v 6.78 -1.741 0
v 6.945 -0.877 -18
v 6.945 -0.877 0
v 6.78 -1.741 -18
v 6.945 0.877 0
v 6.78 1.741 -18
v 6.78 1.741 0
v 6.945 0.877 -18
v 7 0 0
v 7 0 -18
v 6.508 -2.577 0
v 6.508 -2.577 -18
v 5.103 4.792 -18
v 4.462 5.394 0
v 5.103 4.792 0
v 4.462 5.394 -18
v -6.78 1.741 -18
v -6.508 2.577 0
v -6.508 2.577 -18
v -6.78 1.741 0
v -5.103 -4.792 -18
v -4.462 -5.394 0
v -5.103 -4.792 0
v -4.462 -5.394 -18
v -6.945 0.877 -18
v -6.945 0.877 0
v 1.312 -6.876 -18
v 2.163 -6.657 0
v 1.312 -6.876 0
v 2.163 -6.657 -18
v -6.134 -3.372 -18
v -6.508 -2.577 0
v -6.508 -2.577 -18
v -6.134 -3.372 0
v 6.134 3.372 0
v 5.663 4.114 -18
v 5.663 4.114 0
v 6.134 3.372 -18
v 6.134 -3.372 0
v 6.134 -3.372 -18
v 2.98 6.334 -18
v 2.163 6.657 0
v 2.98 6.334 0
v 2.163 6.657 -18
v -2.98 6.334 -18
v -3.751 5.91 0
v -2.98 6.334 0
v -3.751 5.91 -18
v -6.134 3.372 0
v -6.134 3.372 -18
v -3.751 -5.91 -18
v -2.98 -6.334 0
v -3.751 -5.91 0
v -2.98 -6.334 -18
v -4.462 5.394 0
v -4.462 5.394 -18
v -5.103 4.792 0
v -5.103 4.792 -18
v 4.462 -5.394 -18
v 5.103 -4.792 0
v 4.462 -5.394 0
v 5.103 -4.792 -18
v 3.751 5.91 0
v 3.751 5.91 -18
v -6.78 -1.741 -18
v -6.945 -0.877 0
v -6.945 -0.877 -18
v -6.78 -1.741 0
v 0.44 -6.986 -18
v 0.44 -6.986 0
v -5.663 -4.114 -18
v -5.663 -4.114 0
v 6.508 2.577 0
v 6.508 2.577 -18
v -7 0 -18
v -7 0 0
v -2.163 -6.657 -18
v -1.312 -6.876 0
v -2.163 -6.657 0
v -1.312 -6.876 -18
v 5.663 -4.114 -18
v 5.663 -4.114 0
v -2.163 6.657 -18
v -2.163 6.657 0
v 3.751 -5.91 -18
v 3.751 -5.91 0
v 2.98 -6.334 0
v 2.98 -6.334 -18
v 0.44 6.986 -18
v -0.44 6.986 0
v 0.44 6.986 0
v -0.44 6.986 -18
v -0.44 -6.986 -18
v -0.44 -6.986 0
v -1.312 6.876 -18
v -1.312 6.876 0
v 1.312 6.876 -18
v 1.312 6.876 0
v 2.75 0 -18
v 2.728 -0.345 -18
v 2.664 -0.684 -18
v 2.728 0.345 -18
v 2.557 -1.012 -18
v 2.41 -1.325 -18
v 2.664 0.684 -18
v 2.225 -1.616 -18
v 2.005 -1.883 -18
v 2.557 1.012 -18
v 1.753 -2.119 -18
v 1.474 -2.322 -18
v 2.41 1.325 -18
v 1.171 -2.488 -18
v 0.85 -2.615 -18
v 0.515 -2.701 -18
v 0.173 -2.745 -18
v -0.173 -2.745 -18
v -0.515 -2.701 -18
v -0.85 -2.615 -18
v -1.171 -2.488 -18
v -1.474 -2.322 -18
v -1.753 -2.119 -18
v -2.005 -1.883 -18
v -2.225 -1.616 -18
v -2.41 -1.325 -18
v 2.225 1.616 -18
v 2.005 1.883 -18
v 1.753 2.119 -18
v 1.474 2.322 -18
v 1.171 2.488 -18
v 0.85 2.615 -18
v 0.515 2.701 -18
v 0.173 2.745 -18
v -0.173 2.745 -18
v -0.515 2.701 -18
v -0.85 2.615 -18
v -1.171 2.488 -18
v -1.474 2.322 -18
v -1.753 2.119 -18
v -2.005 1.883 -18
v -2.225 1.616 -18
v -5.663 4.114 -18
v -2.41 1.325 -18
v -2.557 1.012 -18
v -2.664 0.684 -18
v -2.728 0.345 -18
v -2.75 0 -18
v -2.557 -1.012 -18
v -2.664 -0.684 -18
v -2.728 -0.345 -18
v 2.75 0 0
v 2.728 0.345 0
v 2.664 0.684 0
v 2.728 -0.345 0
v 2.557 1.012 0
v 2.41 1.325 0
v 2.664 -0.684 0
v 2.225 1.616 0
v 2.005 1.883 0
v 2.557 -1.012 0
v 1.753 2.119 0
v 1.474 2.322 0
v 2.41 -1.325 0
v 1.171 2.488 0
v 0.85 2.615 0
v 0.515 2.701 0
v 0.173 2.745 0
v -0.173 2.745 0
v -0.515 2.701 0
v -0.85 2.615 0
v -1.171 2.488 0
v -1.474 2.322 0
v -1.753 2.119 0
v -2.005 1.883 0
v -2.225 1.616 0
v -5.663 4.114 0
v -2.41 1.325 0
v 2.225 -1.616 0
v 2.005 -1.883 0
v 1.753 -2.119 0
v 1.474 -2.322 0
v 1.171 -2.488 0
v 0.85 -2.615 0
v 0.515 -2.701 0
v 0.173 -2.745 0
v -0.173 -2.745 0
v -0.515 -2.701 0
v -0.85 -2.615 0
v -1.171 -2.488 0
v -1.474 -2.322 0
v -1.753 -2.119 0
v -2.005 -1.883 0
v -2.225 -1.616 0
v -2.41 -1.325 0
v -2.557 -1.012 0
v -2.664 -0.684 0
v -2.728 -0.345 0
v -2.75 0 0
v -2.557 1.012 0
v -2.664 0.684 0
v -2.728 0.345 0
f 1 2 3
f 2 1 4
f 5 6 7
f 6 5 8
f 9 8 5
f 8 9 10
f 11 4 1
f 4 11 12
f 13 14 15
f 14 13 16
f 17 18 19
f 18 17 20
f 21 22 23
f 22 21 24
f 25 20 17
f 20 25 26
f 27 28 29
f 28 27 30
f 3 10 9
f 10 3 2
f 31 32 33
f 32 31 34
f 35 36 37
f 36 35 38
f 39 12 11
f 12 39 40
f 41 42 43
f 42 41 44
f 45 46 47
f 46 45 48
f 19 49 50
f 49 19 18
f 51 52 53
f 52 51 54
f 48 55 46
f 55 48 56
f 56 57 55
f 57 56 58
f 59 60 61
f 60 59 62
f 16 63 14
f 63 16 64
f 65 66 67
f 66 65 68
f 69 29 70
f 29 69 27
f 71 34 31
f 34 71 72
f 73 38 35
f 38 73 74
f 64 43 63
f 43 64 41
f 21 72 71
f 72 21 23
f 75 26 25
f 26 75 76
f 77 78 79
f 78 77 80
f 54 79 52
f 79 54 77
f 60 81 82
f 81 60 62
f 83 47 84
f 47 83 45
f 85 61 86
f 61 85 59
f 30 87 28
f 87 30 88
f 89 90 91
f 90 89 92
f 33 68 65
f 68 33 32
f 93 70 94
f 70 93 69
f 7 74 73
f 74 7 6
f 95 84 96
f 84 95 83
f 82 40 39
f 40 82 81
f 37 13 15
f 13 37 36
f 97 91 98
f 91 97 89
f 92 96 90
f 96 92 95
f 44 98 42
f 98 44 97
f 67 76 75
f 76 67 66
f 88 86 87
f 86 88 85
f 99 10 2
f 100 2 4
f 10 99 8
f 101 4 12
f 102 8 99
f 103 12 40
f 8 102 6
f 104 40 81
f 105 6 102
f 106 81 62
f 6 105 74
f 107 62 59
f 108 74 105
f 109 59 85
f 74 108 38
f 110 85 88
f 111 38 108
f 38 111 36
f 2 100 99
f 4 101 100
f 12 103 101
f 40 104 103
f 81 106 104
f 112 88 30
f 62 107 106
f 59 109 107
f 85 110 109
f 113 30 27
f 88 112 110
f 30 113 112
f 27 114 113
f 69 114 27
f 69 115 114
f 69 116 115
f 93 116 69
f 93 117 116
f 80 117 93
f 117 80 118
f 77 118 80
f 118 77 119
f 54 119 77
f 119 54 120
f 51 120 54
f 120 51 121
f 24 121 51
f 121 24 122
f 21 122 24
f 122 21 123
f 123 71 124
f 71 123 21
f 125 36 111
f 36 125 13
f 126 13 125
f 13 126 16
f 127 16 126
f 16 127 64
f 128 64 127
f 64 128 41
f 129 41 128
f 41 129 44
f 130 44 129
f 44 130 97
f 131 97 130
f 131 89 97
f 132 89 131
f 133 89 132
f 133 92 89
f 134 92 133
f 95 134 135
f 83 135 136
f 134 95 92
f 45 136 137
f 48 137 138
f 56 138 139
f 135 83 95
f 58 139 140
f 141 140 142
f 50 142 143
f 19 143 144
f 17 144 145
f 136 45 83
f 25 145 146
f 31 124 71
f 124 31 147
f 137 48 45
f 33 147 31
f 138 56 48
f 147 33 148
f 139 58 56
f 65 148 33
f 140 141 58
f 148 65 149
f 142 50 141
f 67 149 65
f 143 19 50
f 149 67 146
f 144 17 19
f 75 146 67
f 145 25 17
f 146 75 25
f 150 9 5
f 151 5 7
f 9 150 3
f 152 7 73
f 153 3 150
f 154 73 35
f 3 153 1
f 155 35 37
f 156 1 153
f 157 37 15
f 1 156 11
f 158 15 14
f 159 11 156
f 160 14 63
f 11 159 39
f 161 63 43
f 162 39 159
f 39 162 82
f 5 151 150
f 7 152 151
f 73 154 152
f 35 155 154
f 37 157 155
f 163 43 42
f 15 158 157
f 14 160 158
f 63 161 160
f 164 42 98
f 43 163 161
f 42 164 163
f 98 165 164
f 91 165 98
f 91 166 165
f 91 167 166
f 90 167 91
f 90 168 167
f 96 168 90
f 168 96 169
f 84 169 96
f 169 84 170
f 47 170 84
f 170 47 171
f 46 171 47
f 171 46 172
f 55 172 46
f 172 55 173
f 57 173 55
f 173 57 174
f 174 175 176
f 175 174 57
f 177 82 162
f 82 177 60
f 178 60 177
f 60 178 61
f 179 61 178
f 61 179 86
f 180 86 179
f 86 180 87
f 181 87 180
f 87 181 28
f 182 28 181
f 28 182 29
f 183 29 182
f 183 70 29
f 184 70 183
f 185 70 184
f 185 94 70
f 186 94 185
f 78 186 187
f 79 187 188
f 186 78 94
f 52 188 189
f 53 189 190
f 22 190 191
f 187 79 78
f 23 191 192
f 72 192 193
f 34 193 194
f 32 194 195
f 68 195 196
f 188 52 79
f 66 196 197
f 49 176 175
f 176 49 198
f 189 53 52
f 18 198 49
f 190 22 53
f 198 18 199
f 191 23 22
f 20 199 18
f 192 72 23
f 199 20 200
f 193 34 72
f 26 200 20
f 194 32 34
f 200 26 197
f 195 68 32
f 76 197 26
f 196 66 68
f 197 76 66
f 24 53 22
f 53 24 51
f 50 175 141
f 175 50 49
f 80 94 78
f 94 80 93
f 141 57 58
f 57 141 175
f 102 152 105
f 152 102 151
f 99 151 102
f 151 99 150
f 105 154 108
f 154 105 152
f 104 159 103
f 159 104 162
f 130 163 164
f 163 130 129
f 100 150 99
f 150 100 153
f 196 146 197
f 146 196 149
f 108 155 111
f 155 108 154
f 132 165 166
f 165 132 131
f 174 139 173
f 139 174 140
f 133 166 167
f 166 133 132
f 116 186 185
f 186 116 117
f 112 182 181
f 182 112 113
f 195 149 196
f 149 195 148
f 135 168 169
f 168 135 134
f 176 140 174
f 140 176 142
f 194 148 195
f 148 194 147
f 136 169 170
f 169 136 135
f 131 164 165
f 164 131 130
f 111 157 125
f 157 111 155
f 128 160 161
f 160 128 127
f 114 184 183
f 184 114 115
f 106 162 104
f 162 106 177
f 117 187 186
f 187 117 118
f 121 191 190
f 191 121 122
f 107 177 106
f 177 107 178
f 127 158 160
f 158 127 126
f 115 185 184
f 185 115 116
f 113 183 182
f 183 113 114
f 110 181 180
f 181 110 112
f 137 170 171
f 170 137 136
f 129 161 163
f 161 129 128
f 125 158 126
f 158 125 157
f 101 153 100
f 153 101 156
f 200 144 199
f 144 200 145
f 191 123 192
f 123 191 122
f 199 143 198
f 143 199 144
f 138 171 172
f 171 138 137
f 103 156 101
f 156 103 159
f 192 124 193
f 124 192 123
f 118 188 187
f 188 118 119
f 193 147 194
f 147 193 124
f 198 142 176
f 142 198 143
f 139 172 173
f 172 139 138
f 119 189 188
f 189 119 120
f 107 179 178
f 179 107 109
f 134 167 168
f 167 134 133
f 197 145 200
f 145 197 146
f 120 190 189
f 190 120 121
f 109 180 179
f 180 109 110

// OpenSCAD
$fn = 50;


difference() {
	union() {
		translate(v = [0, 0, -18.0000000000]) {
			cylinder(h = 18, r = 7.0000000000);
		}
		cylinder(h = 0, r = 17.0000000000);
	}
	union() {
		#translate(v = [0, 0, -18]) {
			cylinder(h = 18, r = 2.7500000000);
		}
	}
}
